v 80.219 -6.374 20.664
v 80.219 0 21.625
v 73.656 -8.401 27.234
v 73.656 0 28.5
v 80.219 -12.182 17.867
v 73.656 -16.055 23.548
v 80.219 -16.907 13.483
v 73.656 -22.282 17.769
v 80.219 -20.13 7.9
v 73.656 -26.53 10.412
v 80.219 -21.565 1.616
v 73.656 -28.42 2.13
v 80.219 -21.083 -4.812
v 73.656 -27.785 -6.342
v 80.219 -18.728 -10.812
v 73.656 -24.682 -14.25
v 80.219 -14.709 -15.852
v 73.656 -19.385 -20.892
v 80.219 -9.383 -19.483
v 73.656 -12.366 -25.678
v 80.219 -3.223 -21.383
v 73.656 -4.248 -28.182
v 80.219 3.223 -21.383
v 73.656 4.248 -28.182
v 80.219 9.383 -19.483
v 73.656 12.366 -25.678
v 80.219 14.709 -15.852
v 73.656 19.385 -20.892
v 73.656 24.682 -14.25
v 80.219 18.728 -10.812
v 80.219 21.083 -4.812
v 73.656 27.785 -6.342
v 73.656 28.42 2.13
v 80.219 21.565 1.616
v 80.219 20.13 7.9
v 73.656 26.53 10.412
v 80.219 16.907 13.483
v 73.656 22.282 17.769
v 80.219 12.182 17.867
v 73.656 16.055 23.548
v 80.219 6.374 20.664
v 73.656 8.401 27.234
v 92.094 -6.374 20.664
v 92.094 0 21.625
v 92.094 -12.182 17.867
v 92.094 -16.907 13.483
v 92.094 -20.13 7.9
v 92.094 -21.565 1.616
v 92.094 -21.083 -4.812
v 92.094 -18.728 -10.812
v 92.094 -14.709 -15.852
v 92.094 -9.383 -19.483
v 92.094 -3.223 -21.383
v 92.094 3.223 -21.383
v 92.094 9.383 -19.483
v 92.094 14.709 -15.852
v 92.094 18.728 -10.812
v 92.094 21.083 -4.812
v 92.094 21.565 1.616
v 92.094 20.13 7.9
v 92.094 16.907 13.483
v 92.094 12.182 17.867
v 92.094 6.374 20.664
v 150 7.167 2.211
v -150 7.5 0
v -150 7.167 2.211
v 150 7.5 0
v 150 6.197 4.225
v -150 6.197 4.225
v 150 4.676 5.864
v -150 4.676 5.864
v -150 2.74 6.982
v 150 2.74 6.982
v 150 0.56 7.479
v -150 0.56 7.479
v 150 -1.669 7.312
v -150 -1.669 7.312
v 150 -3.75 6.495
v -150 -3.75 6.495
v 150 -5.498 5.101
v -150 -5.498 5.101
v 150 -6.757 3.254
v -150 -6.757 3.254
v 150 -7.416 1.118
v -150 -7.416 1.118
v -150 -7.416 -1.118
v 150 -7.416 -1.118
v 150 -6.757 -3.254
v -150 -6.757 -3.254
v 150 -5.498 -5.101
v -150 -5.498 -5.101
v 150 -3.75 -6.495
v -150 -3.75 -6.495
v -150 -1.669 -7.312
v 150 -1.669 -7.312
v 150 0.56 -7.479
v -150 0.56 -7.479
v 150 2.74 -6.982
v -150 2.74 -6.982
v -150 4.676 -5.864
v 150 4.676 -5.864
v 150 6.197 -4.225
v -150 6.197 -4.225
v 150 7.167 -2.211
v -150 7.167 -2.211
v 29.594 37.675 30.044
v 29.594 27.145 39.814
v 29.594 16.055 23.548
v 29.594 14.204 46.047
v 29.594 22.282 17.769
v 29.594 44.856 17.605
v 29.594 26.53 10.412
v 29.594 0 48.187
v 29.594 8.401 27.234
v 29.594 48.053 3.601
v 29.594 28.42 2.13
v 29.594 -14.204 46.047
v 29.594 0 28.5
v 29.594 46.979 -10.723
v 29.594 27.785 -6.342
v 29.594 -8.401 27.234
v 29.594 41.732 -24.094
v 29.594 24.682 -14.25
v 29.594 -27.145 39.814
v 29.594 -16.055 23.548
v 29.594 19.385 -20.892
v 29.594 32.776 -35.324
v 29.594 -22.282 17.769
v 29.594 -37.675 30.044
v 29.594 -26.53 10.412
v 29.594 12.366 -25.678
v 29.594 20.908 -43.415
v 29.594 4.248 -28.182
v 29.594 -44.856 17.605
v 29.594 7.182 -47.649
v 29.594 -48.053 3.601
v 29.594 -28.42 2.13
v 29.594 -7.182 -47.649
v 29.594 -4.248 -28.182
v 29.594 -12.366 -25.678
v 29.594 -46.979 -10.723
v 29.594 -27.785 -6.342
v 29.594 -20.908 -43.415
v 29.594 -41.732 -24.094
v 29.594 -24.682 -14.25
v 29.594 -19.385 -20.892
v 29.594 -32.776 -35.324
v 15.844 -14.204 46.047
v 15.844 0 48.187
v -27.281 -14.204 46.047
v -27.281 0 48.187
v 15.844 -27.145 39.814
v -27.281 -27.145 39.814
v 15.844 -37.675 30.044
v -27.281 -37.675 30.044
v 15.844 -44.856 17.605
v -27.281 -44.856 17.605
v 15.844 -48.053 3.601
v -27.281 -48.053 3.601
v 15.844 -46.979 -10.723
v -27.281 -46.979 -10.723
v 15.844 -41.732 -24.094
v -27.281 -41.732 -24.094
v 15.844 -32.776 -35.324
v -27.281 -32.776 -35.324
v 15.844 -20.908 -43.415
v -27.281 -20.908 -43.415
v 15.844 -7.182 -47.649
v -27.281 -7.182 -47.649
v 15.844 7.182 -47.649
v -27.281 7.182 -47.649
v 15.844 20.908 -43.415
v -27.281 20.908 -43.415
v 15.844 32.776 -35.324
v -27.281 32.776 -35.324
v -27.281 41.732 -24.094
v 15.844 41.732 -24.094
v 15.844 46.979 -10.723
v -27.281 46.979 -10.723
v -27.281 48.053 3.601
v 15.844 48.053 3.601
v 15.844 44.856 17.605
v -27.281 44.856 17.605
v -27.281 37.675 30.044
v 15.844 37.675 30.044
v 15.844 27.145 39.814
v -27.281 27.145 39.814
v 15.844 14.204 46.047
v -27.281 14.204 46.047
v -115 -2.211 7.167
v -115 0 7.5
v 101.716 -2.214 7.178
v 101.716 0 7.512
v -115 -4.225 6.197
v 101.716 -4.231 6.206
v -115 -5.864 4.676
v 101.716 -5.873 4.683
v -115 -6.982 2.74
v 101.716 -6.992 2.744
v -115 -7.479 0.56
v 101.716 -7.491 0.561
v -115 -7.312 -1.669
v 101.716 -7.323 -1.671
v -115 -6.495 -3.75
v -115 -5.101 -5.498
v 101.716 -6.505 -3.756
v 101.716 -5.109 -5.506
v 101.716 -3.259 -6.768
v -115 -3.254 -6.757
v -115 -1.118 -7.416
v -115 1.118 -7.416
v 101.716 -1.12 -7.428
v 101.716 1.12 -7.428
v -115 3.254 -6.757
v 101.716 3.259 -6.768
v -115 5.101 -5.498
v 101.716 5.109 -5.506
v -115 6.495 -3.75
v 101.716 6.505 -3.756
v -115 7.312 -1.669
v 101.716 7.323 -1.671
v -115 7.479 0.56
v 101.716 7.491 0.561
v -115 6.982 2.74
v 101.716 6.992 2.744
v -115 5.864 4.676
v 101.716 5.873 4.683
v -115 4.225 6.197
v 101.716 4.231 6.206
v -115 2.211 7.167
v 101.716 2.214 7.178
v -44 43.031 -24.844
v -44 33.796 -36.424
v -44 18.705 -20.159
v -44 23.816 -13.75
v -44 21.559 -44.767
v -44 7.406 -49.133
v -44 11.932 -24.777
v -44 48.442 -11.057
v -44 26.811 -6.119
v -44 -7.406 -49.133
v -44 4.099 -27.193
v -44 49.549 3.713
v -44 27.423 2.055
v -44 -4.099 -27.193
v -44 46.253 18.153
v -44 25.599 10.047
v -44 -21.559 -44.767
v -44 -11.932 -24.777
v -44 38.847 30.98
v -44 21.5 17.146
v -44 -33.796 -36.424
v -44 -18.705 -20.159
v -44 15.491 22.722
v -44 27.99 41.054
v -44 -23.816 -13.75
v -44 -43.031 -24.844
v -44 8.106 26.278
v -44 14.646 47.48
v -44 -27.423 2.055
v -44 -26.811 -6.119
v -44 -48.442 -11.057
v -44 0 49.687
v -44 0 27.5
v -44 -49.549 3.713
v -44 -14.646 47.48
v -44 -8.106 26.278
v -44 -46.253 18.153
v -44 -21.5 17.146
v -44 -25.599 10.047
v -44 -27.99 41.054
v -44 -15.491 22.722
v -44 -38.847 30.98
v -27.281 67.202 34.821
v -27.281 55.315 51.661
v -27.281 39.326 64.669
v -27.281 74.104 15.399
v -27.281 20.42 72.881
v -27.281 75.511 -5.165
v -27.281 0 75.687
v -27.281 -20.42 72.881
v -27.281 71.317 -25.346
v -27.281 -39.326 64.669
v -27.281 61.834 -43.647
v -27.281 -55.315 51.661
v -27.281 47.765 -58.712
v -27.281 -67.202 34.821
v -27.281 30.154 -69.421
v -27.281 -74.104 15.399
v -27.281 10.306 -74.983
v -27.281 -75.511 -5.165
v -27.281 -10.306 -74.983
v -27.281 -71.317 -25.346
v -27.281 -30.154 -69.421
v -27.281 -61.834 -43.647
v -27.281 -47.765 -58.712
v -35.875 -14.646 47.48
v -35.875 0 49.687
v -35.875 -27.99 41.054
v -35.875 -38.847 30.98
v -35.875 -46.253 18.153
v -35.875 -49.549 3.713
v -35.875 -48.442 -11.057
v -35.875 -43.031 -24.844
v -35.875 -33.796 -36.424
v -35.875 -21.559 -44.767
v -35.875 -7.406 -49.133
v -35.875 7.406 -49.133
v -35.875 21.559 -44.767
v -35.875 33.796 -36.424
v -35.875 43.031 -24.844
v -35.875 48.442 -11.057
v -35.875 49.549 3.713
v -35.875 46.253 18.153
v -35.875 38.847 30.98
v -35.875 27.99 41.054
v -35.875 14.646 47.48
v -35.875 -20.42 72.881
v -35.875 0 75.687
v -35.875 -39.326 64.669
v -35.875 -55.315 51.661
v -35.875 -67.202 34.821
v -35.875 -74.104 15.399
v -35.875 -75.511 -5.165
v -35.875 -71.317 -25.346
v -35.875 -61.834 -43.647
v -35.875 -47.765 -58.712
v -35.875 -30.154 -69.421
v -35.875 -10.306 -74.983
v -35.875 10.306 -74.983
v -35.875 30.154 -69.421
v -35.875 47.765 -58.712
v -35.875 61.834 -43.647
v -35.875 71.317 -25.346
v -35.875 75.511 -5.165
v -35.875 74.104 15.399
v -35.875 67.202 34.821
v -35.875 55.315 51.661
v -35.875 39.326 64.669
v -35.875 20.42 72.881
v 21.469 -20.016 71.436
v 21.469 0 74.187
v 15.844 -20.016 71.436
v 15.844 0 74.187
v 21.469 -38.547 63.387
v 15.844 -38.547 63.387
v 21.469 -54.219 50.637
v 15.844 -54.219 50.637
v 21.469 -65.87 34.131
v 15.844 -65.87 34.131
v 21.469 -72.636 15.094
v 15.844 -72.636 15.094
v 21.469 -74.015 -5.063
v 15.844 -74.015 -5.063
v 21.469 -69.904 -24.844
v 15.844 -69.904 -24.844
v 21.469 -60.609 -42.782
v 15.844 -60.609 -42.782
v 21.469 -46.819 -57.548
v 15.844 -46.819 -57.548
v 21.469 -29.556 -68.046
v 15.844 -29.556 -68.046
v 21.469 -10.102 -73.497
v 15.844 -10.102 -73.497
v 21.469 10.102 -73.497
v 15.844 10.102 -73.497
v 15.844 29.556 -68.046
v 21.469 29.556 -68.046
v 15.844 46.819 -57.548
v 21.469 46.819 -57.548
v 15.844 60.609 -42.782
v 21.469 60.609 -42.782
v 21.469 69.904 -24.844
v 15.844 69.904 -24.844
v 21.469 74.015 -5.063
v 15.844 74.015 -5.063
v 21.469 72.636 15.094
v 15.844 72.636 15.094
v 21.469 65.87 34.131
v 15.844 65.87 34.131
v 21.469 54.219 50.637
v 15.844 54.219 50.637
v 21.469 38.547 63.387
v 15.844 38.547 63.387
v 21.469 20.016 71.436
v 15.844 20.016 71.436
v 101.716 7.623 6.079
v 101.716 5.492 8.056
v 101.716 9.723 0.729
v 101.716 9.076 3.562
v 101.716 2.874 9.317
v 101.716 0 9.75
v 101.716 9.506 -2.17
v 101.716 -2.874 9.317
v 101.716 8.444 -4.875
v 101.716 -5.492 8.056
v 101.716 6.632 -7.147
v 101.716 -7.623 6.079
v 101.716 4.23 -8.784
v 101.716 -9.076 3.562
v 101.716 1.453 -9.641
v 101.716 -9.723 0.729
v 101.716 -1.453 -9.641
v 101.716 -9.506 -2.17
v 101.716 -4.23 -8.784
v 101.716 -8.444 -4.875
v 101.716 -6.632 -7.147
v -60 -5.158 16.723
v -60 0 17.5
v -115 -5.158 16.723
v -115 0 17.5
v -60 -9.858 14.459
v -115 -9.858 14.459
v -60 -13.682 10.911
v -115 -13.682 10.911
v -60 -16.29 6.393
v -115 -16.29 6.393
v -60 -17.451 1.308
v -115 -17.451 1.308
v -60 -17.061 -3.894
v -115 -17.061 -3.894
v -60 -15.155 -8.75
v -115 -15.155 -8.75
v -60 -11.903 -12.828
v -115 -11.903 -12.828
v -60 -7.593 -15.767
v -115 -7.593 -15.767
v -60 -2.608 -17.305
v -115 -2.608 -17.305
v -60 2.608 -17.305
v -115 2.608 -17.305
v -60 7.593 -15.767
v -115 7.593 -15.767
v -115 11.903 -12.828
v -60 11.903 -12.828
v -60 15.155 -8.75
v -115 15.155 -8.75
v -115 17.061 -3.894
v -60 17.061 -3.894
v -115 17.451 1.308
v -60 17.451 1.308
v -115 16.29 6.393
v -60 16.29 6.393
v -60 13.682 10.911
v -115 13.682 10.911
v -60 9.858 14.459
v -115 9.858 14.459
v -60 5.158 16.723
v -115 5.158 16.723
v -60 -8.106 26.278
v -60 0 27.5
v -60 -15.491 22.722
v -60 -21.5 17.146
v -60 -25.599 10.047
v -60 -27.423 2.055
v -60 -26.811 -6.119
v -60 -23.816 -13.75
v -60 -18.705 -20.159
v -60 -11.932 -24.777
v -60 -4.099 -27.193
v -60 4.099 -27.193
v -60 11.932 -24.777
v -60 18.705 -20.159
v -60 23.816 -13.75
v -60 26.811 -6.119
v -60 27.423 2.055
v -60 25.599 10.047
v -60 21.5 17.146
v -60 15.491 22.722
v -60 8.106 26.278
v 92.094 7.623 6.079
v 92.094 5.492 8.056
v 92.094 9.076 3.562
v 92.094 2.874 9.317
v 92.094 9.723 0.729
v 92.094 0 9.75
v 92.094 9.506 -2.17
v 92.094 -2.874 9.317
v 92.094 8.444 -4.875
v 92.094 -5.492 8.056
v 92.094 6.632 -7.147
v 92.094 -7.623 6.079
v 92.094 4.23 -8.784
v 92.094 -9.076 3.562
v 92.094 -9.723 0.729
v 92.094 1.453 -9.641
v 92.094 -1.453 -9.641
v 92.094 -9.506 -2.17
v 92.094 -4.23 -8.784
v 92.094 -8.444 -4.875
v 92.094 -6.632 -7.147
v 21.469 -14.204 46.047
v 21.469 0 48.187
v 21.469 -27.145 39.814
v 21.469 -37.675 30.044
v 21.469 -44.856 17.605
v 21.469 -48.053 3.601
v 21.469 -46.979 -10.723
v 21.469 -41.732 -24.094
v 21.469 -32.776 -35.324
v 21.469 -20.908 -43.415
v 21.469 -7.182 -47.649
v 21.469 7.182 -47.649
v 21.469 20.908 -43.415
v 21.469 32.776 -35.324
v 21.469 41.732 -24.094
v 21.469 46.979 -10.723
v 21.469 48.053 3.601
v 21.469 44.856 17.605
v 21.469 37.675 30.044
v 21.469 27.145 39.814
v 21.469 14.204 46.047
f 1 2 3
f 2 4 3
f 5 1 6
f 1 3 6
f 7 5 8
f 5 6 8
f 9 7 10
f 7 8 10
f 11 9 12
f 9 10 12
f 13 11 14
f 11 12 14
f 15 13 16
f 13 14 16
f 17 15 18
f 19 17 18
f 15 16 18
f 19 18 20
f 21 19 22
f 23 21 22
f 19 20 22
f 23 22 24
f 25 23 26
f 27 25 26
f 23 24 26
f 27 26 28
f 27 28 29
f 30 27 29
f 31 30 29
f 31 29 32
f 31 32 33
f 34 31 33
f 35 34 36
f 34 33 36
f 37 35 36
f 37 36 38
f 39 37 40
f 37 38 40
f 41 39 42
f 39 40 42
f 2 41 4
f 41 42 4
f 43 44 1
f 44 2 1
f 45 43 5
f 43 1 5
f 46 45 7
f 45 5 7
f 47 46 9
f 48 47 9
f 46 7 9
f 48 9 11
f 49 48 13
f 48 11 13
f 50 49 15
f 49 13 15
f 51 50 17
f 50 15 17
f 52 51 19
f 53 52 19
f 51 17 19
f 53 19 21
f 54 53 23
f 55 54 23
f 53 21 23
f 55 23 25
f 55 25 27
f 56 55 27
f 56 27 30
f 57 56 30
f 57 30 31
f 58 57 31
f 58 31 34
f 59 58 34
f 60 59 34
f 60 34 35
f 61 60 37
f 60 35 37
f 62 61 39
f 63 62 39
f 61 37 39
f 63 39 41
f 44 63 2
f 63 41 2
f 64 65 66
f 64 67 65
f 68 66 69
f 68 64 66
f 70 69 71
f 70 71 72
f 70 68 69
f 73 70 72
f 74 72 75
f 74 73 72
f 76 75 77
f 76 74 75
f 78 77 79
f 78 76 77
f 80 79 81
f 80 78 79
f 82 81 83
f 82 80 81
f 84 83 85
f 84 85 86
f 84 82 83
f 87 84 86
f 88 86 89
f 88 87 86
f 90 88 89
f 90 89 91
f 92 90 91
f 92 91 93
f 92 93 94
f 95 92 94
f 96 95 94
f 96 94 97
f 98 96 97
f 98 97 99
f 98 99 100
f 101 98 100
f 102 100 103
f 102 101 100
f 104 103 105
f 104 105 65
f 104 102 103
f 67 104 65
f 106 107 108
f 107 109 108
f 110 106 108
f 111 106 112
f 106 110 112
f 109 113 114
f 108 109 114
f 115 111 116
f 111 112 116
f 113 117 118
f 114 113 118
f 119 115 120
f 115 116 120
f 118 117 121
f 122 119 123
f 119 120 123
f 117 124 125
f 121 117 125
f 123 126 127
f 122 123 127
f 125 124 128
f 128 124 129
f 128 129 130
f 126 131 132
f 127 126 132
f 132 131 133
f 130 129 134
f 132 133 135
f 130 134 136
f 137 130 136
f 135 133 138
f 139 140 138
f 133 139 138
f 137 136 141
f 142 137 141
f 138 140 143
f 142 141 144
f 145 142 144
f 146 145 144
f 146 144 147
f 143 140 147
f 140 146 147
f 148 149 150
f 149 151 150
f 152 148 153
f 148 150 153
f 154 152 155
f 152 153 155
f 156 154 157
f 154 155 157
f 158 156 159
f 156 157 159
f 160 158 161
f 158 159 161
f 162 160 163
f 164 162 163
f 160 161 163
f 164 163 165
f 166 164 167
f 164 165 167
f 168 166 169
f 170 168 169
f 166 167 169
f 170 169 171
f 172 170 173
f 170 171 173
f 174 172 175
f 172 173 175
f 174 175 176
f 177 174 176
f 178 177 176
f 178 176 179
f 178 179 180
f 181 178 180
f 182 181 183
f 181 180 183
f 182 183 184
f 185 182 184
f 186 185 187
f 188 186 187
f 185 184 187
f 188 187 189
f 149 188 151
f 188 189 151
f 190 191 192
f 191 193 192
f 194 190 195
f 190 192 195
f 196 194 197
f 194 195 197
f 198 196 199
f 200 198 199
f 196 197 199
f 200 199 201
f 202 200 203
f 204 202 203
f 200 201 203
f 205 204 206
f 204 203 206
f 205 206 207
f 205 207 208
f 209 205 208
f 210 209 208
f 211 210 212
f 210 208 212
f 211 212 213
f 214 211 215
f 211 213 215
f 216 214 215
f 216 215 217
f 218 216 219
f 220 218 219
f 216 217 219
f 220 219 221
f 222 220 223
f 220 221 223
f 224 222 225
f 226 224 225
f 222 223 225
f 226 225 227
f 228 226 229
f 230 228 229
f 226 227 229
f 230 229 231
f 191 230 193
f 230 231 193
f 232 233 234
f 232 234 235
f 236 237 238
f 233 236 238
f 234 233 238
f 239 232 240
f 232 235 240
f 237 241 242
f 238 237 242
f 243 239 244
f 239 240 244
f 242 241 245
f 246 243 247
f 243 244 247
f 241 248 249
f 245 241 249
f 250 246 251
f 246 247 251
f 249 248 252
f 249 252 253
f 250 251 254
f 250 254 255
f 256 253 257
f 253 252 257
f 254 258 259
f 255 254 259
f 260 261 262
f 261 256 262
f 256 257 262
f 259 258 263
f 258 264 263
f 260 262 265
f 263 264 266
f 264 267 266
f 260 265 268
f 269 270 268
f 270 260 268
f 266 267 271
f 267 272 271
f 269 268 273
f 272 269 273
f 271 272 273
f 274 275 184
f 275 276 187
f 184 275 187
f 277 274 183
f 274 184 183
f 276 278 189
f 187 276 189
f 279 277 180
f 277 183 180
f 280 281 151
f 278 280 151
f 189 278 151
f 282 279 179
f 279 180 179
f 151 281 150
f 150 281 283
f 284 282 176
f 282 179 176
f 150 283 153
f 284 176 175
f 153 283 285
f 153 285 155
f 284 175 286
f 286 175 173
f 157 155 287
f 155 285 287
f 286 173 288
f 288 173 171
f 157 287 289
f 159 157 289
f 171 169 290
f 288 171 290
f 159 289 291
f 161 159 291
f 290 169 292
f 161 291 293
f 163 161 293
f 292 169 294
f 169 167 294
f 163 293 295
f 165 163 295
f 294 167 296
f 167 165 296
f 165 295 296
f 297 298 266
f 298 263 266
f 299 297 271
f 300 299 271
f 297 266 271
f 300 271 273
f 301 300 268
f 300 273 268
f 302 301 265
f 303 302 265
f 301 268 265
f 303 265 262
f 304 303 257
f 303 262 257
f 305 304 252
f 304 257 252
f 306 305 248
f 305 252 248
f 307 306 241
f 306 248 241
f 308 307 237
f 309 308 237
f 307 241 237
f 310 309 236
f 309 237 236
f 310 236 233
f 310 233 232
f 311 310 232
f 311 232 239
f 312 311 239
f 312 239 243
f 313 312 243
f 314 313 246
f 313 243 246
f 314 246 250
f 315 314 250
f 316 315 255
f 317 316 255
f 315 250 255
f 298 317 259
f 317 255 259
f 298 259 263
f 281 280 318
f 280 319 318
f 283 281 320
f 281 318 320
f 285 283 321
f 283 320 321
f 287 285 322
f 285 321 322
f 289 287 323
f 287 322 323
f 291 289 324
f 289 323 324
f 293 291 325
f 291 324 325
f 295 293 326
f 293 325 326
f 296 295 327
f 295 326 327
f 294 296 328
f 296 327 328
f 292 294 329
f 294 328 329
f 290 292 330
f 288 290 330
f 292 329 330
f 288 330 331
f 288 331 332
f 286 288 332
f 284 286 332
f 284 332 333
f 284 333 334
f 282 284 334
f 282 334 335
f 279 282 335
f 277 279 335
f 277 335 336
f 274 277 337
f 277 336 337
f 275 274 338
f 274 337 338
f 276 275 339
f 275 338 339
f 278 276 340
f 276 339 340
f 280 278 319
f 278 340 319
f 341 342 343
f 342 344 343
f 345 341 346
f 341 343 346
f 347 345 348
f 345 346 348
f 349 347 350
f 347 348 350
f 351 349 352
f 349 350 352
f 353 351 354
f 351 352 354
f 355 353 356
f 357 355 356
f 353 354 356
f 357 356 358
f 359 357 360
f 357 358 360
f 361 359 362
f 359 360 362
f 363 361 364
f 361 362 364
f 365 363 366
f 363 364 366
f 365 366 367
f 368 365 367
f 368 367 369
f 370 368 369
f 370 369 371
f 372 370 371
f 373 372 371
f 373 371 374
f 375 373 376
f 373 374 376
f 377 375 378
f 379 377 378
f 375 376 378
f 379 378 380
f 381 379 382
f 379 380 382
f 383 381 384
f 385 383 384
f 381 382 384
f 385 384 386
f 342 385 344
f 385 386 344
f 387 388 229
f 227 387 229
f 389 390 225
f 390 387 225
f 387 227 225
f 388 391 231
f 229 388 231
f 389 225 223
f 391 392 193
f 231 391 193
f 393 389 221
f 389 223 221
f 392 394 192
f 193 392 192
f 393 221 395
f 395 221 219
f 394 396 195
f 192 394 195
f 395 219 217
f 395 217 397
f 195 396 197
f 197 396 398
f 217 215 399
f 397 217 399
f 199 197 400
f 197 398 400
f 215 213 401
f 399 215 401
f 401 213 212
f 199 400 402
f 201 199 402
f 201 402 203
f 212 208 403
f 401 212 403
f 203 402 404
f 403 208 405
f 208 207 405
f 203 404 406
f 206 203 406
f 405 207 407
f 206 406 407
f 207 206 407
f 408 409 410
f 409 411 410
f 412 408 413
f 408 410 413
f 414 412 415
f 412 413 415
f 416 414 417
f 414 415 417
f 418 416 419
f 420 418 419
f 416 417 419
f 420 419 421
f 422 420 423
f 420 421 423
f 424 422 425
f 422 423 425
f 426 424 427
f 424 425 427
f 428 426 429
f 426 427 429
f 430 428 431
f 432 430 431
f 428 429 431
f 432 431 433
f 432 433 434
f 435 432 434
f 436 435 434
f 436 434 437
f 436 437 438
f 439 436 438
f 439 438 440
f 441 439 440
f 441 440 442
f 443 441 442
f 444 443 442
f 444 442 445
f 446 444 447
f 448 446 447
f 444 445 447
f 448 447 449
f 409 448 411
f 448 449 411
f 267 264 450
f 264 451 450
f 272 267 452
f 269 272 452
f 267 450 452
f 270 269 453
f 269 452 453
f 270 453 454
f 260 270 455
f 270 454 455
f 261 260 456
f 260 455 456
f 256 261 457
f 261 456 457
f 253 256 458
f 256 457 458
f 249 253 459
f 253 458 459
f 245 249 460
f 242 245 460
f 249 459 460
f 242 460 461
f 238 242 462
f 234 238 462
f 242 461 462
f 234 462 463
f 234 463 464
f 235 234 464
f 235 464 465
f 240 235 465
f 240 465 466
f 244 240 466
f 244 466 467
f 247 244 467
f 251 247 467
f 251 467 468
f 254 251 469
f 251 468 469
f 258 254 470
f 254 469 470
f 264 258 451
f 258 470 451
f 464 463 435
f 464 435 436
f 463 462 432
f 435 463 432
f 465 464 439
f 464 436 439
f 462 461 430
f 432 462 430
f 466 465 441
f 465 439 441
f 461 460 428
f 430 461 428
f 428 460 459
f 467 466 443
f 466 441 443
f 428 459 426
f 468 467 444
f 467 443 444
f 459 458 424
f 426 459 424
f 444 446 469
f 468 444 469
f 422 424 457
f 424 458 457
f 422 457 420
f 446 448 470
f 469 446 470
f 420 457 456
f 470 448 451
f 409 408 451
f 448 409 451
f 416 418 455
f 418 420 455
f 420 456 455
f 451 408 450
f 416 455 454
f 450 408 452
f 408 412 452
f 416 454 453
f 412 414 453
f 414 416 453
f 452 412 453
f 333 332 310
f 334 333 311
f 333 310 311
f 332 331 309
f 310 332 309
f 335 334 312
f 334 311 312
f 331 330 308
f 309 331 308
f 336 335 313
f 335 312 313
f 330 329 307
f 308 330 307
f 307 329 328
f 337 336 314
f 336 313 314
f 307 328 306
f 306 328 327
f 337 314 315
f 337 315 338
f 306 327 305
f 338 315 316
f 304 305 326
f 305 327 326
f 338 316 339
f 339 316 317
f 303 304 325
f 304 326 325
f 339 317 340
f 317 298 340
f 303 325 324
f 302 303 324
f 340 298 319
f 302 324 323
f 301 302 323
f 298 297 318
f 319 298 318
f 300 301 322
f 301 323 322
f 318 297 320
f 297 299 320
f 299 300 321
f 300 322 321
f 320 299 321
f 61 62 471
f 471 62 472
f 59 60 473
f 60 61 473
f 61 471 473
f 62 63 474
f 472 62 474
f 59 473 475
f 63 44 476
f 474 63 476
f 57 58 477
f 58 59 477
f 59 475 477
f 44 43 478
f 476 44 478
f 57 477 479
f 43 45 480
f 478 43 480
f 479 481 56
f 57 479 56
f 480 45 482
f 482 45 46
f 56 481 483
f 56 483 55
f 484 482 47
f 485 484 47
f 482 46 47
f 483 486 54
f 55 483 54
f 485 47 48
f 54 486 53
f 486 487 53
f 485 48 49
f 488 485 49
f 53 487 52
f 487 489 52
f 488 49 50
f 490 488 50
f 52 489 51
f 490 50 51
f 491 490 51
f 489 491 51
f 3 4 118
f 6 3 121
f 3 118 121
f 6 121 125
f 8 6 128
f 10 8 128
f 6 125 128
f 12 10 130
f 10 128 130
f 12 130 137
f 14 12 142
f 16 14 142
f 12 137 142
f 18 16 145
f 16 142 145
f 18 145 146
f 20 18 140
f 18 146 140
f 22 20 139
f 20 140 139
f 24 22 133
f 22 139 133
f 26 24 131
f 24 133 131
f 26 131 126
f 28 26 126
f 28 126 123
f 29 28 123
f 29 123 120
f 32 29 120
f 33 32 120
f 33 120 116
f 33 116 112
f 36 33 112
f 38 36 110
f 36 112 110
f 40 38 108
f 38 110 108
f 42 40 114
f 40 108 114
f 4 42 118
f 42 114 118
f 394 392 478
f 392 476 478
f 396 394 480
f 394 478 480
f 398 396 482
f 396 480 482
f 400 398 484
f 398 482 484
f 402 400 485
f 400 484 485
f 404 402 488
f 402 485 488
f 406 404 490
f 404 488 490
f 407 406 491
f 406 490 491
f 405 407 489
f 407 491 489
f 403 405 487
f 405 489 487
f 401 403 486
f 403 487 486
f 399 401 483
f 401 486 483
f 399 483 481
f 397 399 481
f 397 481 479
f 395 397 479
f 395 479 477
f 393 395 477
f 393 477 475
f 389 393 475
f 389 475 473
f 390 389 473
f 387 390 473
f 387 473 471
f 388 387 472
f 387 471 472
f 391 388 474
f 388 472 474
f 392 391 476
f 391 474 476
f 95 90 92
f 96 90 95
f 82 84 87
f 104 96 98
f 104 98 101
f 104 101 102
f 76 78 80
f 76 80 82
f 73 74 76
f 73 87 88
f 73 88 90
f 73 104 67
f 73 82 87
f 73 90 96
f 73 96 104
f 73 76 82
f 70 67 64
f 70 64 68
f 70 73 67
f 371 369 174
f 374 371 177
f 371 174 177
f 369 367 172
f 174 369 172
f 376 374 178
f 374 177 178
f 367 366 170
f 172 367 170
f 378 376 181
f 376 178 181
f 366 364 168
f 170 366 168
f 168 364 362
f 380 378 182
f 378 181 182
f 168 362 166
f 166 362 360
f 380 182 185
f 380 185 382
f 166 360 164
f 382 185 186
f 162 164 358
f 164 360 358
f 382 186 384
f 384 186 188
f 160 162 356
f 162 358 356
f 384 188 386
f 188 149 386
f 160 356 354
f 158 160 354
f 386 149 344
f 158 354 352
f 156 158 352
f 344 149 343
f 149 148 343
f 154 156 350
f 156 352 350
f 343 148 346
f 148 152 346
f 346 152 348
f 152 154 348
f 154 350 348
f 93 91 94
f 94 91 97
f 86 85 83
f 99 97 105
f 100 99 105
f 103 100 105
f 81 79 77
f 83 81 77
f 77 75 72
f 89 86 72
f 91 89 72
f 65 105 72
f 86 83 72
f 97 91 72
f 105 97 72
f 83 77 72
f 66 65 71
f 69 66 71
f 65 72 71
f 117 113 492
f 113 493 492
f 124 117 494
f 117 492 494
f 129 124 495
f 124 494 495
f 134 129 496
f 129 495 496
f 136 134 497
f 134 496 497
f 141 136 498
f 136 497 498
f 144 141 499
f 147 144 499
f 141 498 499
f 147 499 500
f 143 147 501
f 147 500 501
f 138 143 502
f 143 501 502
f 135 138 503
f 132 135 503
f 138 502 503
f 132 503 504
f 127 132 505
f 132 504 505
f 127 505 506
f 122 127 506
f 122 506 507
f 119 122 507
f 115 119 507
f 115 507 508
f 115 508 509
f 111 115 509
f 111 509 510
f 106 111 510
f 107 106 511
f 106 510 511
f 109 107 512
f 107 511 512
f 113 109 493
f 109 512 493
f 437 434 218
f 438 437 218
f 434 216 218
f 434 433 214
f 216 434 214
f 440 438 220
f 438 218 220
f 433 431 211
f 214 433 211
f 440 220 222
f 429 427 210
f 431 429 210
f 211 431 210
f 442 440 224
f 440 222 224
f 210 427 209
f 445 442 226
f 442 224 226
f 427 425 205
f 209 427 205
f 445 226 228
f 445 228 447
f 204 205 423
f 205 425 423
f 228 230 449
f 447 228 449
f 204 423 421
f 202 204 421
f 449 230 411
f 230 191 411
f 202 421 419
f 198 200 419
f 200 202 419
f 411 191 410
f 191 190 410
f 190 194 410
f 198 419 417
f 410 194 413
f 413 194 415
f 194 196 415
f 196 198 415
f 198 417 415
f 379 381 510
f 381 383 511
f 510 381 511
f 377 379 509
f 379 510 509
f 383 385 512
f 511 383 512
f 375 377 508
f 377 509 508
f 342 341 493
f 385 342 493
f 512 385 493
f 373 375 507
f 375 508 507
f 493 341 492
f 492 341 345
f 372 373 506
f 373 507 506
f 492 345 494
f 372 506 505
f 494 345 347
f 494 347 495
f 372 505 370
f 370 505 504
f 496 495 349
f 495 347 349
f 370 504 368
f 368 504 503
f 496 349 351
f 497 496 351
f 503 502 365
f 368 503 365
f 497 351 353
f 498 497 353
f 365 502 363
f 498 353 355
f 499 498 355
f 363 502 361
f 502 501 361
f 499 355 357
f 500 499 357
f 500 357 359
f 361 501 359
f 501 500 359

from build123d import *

# Parameters (mm, degrees)
F0_R     = 7.5
F1_DEPTH = 150


with BuildPart() as f1:
    # F0 (on Right) → F1 (new body, symmetric)
    with BuildSketch(Plane.YZ):
        Circle(F0_R)
    extrude(amount=F1_DEPTH, both=True)


with BuildPart() as f3:
    # F2 (on Front) → F3 (revolve)
    with BuildSketch(Plane.XZ):
        Polygon((-115, 17.5), (-115, 7.5), (101.7164443272, 7.511508713), (101.7164443272, 9.7499957391), (92.09375605, 9.7499957391), (92.09375605, 21.6249969955), (80.2187565416, 21.6249969955), (73.6562560773, 28.4999943187), (29.5937514613, 28.4999943187), (29.5937514613, 48.1874957117), (21.4687474735, 48.1874957117), (21.4687474735, 74.1874957117), (15.8437498225, 74.1874957117), (15.8437498225, 48.1874957117), (0, 48.1874957117), (-27.2812519802, 48.1874957117), (-27.2812519802, 75.6874989894), (-35.8750012564, 75.6874989894), (-35.8750012564, 49.6874989894), (-44, 49.6874989894), (-44, 27.5), (-60, 27.5), (-60, 17.5), align=None)
    revolve(axis=Axis((0, 0, 0), (1, 0, 0)))


solid = Compound([f1.part, f3.part])
